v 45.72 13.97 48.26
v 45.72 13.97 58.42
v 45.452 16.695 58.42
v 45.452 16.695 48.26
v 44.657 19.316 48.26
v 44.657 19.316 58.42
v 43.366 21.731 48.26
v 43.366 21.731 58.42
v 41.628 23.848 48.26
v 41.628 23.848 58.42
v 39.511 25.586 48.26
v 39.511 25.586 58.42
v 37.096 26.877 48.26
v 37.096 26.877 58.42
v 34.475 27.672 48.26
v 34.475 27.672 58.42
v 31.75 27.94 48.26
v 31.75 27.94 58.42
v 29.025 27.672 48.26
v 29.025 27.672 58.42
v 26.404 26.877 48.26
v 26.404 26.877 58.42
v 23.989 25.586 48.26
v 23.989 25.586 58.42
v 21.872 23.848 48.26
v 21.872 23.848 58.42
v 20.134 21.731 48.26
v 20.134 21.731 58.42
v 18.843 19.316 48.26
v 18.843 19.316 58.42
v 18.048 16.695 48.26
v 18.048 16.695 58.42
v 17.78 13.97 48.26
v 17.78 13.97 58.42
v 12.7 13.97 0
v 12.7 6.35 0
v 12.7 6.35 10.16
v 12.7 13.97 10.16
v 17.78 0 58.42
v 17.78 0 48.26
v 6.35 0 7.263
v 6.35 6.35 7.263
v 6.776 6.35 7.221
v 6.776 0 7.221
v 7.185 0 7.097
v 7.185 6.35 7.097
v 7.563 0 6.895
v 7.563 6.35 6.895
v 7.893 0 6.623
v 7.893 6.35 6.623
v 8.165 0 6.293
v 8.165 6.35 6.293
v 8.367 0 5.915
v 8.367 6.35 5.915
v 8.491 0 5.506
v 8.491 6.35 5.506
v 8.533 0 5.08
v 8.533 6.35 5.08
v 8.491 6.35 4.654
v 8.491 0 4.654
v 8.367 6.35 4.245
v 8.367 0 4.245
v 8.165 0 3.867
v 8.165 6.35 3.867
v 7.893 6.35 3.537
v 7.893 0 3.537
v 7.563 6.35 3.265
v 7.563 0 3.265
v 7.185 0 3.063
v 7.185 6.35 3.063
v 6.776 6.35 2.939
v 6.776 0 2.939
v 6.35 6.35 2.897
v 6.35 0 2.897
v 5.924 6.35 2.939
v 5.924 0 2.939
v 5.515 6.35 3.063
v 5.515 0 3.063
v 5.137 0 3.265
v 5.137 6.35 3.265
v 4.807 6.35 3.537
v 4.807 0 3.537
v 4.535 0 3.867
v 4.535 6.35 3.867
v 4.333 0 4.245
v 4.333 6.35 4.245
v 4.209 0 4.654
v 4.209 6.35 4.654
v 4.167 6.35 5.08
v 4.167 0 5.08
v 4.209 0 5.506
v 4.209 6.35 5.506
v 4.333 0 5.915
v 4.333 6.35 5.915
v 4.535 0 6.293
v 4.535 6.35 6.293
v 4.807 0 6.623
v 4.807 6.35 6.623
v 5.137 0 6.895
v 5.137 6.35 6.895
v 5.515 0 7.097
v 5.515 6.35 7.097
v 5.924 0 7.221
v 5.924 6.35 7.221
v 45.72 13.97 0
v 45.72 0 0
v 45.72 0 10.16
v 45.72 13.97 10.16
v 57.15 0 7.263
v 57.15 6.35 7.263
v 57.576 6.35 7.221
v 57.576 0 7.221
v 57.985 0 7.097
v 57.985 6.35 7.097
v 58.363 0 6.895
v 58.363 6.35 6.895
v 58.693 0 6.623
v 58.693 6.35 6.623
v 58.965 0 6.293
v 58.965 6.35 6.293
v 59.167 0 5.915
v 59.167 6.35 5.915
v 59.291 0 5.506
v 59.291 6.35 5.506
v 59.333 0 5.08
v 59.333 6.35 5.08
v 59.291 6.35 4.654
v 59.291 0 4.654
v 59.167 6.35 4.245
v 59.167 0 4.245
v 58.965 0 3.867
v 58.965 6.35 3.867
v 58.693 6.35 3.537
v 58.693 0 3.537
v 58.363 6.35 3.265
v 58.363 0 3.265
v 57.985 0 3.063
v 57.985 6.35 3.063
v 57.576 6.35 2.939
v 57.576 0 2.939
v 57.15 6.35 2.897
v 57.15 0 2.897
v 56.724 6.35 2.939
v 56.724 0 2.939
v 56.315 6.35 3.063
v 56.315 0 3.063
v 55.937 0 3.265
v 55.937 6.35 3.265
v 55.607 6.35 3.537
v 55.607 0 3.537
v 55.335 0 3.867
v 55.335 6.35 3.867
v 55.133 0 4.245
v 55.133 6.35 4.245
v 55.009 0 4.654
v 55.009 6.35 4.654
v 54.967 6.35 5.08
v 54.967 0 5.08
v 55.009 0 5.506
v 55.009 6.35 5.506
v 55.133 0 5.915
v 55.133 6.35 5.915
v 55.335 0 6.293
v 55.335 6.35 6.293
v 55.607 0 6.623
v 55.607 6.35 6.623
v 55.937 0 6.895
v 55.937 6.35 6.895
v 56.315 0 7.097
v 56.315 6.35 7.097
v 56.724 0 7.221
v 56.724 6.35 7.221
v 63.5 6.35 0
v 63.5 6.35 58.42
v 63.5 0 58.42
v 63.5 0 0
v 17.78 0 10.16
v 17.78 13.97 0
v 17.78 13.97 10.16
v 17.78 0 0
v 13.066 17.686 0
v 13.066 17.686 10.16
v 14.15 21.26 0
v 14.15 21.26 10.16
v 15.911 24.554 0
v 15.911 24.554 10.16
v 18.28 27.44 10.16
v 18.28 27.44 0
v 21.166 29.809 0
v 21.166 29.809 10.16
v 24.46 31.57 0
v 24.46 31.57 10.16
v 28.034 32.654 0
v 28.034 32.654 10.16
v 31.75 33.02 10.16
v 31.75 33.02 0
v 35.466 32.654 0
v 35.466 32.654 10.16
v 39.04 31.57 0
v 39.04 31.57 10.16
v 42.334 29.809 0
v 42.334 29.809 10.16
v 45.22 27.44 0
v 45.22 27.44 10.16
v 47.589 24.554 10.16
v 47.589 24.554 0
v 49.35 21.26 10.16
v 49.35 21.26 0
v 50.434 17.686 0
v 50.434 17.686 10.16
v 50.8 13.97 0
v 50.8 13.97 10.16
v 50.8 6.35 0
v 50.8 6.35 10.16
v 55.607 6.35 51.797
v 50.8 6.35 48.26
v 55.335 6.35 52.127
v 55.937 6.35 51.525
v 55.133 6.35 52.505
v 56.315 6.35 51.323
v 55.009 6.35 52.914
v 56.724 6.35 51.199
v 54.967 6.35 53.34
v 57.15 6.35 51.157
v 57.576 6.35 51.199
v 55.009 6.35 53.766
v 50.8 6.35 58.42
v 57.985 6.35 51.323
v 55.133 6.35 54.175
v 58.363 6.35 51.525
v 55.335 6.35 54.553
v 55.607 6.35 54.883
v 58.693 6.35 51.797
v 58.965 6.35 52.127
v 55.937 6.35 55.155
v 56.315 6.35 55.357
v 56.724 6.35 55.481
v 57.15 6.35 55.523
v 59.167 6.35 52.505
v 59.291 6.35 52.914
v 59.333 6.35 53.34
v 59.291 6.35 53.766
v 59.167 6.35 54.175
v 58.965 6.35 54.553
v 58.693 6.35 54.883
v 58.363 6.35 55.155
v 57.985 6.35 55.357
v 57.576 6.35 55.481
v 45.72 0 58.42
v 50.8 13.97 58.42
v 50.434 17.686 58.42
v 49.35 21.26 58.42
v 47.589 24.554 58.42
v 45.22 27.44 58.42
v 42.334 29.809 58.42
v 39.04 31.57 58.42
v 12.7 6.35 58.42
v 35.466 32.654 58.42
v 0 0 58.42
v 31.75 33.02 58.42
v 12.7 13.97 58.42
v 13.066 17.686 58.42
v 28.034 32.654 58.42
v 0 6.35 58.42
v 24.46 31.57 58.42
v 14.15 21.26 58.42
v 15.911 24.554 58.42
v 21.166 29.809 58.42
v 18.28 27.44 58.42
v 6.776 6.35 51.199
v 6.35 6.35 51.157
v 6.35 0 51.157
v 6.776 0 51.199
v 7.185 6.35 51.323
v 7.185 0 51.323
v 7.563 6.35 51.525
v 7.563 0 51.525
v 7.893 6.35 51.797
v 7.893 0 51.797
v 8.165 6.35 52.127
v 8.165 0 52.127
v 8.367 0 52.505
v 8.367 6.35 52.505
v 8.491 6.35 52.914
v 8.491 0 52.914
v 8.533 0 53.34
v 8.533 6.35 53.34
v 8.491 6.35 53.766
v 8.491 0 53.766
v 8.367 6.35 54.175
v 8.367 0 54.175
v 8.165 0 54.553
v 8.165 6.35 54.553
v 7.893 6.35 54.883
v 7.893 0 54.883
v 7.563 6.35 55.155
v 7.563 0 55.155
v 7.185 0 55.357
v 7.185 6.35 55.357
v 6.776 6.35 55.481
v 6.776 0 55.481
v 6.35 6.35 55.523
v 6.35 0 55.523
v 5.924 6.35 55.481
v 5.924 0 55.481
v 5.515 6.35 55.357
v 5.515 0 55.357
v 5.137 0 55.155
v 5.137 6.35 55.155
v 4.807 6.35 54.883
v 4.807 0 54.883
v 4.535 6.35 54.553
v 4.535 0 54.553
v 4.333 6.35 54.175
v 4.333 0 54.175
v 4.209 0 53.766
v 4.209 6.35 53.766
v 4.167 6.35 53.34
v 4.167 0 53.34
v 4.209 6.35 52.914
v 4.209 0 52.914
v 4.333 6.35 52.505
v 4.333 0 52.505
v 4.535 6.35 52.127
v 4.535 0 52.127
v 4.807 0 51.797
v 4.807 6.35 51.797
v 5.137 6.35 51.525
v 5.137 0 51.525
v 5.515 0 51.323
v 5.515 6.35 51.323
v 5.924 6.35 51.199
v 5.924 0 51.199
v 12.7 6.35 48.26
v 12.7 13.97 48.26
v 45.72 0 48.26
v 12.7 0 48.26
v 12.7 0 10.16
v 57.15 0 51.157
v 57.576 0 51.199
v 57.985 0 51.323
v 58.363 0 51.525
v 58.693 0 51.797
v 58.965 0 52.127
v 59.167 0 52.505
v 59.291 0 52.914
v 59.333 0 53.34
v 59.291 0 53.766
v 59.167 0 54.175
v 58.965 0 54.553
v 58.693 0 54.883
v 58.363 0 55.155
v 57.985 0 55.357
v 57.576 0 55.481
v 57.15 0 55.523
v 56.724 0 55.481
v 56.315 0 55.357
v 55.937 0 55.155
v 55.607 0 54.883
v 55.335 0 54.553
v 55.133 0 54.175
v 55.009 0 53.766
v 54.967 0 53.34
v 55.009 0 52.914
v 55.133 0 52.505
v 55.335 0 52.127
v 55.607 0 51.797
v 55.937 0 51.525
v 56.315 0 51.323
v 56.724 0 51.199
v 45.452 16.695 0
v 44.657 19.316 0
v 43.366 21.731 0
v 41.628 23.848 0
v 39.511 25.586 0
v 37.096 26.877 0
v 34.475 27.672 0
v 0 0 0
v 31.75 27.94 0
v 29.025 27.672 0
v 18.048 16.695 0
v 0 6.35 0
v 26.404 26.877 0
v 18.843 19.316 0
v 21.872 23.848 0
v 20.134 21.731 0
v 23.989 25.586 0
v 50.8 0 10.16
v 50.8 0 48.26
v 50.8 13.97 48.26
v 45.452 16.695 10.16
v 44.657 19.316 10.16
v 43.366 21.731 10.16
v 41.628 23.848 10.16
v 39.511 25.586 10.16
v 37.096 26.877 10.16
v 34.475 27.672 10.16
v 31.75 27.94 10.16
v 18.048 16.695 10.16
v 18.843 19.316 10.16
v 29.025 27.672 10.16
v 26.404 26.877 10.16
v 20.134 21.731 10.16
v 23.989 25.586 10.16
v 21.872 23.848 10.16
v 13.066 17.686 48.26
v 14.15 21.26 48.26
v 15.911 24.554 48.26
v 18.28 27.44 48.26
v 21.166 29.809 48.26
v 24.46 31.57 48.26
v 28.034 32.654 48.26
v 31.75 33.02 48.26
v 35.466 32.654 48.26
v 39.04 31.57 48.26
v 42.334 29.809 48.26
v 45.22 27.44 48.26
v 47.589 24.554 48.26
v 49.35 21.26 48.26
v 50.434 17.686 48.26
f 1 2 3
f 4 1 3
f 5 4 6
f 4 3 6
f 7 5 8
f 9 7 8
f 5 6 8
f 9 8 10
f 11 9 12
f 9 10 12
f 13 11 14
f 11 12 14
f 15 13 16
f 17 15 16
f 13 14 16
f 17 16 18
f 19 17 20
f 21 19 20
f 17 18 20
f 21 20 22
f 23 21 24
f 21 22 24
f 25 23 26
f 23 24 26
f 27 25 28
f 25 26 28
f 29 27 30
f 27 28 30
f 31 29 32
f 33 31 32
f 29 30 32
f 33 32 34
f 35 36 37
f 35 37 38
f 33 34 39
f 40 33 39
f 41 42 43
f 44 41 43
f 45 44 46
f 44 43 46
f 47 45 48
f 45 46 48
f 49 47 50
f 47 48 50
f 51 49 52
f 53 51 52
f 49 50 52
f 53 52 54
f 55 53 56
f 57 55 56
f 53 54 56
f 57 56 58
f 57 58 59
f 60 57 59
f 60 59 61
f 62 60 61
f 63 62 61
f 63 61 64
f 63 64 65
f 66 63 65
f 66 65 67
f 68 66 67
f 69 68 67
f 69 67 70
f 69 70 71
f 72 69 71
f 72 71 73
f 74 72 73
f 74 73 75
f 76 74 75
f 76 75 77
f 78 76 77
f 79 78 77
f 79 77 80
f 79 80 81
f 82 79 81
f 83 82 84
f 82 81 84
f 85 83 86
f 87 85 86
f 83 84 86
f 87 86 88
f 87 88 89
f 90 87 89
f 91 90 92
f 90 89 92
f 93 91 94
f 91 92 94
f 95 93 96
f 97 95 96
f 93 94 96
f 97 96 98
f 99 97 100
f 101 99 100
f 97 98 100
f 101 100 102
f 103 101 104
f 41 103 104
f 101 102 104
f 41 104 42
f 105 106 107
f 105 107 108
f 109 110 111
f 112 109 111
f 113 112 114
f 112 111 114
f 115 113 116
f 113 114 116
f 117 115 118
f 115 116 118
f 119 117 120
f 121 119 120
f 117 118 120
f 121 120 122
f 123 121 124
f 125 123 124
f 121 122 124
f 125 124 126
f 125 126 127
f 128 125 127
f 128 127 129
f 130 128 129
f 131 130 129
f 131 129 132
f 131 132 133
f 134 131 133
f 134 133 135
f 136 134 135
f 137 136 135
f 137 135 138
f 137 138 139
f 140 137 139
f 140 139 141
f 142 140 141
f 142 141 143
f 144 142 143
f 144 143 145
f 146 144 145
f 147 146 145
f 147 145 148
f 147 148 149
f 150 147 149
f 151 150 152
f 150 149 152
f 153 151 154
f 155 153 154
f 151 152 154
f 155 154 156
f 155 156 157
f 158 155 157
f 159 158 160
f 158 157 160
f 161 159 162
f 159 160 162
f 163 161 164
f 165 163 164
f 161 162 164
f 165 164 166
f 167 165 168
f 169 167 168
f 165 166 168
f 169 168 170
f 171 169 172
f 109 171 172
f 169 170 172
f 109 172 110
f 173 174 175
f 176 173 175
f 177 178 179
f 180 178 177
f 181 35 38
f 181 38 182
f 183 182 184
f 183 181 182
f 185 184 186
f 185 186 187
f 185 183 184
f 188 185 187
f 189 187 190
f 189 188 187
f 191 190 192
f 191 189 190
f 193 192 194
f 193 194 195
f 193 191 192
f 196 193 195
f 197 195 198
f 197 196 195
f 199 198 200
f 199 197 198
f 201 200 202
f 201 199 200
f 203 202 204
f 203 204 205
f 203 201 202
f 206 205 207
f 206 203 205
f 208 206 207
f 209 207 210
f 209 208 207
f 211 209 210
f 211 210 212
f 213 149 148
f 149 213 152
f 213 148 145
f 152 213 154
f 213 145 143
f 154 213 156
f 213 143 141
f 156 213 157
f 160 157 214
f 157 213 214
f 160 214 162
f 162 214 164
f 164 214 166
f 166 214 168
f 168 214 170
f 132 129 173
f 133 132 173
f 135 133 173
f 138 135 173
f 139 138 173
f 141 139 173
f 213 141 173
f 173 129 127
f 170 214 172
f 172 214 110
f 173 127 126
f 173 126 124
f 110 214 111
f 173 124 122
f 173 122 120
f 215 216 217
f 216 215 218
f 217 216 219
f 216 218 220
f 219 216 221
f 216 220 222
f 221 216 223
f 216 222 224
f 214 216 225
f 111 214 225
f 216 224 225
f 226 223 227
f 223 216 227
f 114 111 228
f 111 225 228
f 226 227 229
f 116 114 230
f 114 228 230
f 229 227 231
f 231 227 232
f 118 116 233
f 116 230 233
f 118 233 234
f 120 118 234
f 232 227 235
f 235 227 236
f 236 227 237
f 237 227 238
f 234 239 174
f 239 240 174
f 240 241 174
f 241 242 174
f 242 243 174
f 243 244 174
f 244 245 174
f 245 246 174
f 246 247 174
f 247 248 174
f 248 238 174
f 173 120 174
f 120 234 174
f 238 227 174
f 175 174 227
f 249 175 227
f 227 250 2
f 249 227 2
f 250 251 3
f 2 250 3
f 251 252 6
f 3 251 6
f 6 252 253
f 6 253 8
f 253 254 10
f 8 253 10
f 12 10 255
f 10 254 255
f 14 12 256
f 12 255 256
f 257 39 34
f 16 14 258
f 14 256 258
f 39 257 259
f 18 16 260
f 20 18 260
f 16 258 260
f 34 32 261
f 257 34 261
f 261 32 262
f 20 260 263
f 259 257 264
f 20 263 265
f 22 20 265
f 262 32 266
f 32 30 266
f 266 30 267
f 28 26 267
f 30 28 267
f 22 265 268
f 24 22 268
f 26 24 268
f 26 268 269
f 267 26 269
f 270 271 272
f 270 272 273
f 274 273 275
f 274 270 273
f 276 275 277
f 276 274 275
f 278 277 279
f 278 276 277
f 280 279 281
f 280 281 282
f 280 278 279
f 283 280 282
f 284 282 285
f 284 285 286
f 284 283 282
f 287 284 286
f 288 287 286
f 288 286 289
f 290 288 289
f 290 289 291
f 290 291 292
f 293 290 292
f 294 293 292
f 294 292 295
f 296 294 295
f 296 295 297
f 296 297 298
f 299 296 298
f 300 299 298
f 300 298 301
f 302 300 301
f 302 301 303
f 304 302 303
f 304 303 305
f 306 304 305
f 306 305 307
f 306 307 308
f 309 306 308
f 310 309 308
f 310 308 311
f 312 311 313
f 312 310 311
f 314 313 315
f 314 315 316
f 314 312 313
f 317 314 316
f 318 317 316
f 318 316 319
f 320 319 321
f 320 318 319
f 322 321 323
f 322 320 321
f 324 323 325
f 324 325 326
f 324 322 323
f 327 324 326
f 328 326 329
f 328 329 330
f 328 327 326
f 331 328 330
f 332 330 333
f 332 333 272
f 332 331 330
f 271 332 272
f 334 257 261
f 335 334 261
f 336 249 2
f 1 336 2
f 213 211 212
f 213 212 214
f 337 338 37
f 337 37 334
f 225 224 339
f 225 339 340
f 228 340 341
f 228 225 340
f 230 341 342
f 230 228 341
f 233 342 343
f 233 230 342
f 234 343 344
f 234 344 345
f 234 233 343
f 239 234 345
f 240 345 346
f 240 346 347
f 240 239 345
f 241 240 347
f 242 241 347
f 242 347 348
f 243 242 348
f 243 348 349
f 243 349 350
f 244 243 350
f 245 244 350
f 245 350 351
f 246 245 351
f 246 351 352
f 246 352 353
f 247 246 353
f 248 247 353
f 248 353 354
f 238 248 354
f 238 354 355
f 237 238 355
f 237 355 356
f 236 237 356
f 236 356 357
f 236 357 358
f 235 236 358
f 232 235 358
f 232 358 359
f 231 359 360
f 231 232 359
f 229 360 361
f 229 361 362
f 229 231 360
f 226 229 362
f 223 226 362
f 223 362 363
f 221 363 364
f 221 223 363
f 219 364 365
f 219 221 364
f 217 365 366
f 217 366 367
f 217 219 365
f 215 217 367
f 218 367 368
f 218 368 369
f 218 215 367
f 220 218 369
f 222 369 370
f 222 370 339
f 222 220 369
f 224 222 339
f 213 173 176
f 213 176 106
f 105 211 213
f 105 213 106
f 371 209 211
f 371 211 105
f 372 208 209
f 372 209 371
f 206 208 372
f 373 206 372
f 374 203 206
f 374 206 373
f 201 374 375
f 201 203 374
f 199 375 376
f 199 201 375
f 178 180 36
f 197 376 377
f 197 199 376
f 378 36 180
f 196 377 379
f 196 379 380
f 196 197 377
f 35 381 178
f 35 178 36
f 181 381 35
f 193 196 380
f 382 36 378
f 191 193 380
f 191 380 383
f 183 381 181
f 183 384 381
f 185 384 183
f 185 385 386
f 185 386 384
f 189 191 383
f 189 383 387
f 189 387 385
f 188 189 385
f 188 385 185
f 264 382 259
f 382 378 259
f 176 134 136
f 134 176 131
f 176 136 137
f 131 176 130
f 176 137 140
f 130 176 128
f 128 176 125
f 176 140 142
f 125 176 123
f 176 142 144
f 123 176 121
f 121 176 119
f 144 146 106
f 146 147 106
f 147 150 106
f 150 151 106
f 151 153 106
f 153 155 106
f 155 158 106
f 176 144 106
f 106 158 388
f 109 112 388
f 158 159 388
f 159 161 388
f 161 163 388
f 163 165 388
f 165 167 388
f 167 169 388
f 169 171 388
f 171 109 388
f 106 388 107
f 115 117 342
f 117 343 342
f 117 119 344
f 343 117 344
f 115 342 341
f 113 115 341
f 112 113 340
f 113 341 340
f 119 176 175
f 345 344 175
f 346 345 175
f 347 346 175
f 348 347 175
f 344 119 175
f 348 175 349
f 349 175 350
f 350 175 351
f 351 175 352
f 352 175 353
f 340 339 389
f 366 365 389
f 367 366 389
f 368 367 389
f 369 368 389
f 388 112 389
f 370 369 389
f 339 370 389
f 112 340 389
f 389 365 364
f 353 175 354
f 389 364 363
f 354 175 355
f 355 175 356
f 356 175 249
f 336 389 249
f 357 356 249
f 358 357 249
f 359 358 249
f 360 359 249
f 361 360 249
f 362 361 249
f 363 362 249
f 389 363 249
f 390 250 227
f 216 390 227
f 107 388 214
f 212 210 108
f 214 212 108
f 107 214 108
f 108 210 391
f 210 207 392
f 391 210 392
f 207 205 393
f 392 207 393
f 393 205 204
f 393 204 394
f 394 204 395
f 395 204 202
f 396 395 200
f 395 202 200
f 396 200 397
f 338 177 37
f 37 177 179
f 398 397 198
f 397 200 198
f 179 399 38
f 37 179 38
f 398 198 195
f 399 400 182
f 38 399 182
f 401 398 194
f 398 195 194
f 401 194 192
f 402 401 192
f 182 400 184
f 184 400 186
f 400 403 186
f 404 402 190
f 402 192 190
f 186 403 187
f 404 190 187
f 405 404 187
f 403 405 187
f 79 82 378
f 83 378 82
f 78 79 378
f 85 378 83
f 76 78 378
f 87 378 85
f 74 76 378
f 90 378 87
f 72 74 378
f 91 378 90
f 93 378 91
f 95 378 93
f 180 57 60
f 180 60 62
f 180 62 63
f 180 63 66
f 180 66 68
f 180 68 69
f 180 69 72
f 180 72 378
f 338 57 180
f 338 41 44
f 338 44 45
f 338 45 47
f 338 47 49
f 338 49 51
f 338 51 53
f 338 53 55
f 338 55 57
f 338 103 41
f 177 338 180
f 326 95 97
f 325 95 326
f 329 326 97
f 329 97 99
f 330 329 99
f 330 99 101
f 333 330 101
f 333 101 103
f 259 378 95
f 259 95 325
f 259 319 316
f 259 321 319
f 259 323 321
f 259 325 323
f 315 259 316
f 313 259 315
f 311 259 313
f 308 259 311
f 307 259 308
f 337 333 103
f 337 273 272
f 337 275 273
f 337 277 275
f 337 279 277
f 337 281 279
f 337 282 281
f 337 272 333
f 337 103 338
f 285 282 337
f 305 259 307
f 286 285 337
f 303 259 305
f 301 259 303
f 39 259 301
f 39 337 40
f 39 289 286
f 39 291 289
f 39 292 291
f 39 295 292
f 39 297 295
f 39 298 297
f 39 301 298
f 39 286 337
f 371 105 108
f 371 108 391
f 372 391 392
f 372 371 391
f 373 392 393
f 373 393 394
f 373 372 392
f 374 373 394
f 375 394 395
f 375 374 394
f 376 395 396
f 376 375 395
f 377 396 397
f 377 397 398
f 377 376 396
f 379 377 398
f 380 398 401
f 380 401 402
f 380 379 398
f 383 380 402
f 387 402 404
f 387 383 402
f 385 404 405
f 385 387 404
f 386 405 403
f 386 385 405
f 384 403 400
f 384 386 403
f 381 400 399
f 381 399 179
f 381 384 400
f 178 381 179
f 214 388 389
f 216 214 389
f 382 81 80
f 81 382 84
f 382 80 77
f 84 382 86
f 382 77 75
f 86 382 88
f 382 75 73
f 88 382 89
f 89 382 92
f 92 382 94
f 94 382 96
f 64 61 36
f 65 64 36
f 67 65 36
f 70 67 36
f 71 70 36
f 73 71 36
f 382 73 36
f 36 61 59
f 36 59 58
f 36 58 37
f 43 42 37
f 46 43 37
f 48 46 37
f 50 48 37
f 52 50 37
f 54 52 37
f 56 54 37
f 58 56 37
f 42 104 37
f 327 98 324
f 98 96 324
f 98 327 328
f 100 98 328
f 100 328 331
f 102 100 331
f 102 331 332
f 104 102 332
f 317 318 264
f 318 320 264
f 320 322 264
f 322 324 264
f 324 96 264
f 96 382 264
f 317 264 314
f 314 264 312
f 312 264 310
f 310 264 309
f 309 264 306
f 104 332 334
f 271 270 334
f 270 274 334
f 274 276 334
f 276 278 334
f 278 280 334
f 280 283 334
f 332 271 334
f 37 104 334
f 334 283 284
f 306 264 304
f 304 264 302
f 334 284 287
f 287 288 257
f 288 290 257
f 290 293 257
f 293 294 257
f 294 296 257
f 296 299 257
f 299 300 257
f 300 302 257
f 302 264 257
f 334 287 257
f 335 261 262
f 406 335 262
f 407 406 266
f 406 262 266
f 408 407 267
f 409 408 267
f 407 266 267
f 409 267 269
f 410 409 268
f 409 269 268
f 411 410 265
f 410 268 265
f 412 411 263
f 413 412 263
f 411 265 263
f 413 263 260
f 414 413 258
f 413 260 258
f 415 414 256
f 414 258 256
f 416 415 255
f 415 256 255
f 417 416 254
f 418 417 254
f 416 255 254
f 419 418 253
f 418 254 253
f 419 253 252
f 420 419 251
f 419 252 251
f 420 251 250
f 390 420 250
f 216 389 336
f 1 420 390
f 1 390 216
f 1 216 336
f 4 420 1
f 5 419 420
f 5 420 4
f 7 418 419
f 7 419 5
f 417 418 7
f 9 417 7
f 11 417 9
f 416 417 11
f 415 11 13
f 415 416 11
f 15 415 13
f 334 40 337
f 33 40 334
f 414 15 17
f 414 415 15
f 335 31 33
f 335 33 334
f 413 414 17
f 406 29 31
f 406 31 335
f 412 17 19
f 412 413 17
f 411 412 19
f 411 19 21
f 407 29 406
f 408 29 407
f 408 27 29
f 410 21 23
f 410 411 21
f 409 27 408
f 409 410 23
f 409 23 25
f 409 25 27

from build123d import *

# Parameters (mm, degrees)
BOSS_EXTRUDE1_DEPTH = 10.16
SKETCH2_R           = 2.1828125
CUT_EXTRUDE1_DEPTH  = 7.62
SKETCH3_W           = 12.7
SKETCH3_H           = 19.05
BOSS_EXTRUDE2_DEPTH = 6.35


with BuildPart() as part:
    # Sketch1 → Boss-Extrude1 (new body)
    with BuildSketch(Plane.XY):
        with BuildLine():
            Line((0, 0), (0, 6.35))
            Line((0, 6.35), (12.7, 6.35))
            Line((12.7, 6.35), (12.7, 13.97))
            ThreePointArc((12.7, 13.97), (31.75, 33.02), (50.8, 13.97))
            Line((50.8, 13.97), (50.8, 6.35))
            Line((50.8, 6.35), (63.5, 6.35))
            Line((63.5, 6.35), (63.5, 0))
            Line((63.5, 0), (45.72, 0))
            Line((45.72, 0), (45.72, 13.97))
            ThreePointArc((45.72, 13.97), (31.75, 27.94), (17.78, 13.97))
            Line((17.78, 13.97), (17.78, 0))
            Line((17.78, 0), (0, 0))
        make_face()
    extrude(amount=BOSS_EXTRUDE1_DEPTH)

    # Sketch2 → Cut-Extrude1 (cut)
    with BuildSketch(Plane(origin=(0, 6.35, 0), x_dir=(1, 0, 0), z_dir=(0, 1, 0))):
        with Locations(Location((6.35, -5.08, 0), (0, 0, 270))):
            Circle(SKETCH2_R)
        with Locations(Location((57.15, -5.08, 0), (0, 0, 270))):
            Circle(SKETCH2_R)
    extrude(amount=-CUT_EXTRUDE1_DEPTH, mode=Mode.SUBTRACT)

    # Sketch3 → Boss-Extrude2 (add)
    with BuildSketch(Plane(origin=(0, 0, 0), x_dir=(1, 0, 0), z_dir=(0, 1, 0))):
        with Locations((6.35, -19.685)):
            Rectangle(SKETCH3_W, SKETCH3_H)
        with Locations((57.15, -19.685)):
            Rectangle(SKETCH3_W, SKETCH3_H)
    extrude(amount=BOSS_EXTRUDE2_DEPTH)

    # Mirror1: part across plane


with BuildPart() as part_1:
    add(part.part)
    add(part.part.mirror(Plane.XY.offset(29.21)))


solid = part_1.part
